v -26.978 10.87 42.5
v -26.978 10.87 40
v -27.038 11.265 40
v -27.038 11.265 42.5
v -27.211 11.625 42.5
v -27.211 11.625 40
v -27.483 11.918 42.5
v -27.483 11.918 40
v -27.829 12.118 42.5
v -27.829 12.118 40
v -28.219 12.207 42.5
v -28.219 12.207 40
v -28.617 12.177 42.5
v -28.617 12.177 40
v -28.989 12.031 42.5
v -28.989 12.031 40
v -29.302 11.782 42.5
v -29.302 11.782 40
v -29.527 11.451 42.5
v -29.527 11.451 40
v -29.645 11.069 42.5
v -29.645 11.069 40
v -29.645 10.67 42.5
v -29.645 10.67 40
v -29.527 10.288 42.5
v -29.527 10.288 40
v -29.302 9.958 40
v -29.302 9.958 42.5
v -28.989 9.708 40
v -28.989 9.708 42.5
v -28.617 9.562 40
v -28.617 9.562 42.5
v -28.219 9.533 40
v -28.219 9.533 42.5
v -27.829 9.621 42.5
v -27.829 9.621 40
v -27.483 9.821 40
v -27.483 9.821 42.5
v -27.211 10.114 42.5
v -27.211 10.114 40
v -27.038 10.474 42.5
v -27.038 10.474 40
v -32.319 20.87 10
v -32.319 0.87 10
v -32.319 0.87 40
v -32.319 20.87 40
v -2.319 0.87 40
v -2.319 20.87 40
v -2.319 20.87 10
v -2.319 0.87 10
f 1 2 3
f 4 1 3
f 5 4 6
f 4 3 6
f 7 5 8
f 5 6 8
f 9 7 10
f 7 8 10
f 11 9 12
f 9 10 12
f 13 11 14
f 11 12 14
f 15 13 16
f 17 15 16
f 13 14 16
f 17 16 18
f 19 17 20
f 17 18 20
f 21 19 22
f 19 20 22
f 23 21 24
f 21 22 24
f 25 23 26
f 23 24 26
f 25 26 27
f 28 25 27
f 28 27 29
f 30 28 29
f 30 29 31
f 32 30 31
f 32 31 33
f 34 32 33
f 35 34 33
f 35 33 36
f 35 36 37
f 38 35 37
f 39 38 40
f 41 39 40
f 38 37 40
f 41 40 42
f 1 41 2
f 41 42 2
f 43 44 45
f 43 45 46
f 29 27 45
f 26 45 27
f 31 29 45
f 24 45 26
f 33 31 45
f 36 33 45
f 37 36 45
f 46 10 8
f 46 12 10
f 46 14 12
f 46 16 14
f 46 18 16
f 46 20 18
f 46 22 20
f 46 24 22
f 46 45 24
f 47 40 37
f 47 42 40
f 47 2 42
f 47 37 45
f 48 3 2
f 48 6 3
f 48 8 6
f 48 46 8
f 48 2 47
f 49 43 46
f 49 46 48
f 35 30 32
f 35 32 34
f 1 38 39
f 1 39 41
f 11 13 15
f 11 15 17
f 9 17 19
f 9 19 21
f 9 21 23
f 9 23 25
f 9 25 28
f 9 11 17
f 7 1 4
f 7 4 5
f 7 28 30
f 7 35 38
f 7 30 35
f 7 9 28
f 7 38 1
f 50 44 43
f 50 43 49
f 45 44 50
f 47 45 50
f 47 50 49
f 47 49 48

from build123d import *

# Parameters (mm, degrees)
SKETCH1_W           = 40
SKETCH1_H           = 20
BOSS_EXTRUDE1_DEPTH = 40
SKETCH2_R           = 1.340799443
BOSS_EXTRUDE2_DEPTH = 2.5
SKETCH3_W           = 40
SKETCH3_H           = 10
CUT_EXTRUDE1_DEPTH  = 20
SKETCH5_W           = 10
SKETCH5_H           = 30
CUT_EXTRUDE4_DEPTH  = 20


with BuildPart() as part:
    # Sketch1 → Boss-Extrude1 (new body)
    with BuildSketch(Plane.XY):
        with Locations((-12.31884058, 10.869565217)):
            Rectangle(SKETCH1_W, SKETCH1_H)
    extrude(amount=BOSS_EXTRUDE1_DEPTH)

    # Sketch2 → Boss-Extrude2 (add)
    with BuildSketch(Plane.XY.offset(40)):
        with Locations((-28.31884058, 10.869565217)):
            Circle(SKETCH2_R)
    extrude(amount=BOSS_EXTRUDE2_DEPTH)

    # Sketch3 → Cut-Extrude1 (cut)
    with BuildSketch(Plane.XZ.offset(-0.869565217)):
        with Locations((-12.31884058, 5)):
            Rectangle(SKETCH3_W, SKETCH3_H)
    extrude(amount=-CUT_EXTRUDE1_DEPTH, mode=Mode.SUBTRACT)

    # Sketch5 → Cut-Extrude4 (cut)
    with BuildSketch(Plane.XZ.offset(-0.869565217)):
        with Locations((2.68115942, 25)):
            Rectangle(SKETCH5_W, SKETCH5_H)
    extrude(amount=-CUT_EXTRUDE4_DEPTH, mode=Mode.SUBTRACT)


solid = part.part
